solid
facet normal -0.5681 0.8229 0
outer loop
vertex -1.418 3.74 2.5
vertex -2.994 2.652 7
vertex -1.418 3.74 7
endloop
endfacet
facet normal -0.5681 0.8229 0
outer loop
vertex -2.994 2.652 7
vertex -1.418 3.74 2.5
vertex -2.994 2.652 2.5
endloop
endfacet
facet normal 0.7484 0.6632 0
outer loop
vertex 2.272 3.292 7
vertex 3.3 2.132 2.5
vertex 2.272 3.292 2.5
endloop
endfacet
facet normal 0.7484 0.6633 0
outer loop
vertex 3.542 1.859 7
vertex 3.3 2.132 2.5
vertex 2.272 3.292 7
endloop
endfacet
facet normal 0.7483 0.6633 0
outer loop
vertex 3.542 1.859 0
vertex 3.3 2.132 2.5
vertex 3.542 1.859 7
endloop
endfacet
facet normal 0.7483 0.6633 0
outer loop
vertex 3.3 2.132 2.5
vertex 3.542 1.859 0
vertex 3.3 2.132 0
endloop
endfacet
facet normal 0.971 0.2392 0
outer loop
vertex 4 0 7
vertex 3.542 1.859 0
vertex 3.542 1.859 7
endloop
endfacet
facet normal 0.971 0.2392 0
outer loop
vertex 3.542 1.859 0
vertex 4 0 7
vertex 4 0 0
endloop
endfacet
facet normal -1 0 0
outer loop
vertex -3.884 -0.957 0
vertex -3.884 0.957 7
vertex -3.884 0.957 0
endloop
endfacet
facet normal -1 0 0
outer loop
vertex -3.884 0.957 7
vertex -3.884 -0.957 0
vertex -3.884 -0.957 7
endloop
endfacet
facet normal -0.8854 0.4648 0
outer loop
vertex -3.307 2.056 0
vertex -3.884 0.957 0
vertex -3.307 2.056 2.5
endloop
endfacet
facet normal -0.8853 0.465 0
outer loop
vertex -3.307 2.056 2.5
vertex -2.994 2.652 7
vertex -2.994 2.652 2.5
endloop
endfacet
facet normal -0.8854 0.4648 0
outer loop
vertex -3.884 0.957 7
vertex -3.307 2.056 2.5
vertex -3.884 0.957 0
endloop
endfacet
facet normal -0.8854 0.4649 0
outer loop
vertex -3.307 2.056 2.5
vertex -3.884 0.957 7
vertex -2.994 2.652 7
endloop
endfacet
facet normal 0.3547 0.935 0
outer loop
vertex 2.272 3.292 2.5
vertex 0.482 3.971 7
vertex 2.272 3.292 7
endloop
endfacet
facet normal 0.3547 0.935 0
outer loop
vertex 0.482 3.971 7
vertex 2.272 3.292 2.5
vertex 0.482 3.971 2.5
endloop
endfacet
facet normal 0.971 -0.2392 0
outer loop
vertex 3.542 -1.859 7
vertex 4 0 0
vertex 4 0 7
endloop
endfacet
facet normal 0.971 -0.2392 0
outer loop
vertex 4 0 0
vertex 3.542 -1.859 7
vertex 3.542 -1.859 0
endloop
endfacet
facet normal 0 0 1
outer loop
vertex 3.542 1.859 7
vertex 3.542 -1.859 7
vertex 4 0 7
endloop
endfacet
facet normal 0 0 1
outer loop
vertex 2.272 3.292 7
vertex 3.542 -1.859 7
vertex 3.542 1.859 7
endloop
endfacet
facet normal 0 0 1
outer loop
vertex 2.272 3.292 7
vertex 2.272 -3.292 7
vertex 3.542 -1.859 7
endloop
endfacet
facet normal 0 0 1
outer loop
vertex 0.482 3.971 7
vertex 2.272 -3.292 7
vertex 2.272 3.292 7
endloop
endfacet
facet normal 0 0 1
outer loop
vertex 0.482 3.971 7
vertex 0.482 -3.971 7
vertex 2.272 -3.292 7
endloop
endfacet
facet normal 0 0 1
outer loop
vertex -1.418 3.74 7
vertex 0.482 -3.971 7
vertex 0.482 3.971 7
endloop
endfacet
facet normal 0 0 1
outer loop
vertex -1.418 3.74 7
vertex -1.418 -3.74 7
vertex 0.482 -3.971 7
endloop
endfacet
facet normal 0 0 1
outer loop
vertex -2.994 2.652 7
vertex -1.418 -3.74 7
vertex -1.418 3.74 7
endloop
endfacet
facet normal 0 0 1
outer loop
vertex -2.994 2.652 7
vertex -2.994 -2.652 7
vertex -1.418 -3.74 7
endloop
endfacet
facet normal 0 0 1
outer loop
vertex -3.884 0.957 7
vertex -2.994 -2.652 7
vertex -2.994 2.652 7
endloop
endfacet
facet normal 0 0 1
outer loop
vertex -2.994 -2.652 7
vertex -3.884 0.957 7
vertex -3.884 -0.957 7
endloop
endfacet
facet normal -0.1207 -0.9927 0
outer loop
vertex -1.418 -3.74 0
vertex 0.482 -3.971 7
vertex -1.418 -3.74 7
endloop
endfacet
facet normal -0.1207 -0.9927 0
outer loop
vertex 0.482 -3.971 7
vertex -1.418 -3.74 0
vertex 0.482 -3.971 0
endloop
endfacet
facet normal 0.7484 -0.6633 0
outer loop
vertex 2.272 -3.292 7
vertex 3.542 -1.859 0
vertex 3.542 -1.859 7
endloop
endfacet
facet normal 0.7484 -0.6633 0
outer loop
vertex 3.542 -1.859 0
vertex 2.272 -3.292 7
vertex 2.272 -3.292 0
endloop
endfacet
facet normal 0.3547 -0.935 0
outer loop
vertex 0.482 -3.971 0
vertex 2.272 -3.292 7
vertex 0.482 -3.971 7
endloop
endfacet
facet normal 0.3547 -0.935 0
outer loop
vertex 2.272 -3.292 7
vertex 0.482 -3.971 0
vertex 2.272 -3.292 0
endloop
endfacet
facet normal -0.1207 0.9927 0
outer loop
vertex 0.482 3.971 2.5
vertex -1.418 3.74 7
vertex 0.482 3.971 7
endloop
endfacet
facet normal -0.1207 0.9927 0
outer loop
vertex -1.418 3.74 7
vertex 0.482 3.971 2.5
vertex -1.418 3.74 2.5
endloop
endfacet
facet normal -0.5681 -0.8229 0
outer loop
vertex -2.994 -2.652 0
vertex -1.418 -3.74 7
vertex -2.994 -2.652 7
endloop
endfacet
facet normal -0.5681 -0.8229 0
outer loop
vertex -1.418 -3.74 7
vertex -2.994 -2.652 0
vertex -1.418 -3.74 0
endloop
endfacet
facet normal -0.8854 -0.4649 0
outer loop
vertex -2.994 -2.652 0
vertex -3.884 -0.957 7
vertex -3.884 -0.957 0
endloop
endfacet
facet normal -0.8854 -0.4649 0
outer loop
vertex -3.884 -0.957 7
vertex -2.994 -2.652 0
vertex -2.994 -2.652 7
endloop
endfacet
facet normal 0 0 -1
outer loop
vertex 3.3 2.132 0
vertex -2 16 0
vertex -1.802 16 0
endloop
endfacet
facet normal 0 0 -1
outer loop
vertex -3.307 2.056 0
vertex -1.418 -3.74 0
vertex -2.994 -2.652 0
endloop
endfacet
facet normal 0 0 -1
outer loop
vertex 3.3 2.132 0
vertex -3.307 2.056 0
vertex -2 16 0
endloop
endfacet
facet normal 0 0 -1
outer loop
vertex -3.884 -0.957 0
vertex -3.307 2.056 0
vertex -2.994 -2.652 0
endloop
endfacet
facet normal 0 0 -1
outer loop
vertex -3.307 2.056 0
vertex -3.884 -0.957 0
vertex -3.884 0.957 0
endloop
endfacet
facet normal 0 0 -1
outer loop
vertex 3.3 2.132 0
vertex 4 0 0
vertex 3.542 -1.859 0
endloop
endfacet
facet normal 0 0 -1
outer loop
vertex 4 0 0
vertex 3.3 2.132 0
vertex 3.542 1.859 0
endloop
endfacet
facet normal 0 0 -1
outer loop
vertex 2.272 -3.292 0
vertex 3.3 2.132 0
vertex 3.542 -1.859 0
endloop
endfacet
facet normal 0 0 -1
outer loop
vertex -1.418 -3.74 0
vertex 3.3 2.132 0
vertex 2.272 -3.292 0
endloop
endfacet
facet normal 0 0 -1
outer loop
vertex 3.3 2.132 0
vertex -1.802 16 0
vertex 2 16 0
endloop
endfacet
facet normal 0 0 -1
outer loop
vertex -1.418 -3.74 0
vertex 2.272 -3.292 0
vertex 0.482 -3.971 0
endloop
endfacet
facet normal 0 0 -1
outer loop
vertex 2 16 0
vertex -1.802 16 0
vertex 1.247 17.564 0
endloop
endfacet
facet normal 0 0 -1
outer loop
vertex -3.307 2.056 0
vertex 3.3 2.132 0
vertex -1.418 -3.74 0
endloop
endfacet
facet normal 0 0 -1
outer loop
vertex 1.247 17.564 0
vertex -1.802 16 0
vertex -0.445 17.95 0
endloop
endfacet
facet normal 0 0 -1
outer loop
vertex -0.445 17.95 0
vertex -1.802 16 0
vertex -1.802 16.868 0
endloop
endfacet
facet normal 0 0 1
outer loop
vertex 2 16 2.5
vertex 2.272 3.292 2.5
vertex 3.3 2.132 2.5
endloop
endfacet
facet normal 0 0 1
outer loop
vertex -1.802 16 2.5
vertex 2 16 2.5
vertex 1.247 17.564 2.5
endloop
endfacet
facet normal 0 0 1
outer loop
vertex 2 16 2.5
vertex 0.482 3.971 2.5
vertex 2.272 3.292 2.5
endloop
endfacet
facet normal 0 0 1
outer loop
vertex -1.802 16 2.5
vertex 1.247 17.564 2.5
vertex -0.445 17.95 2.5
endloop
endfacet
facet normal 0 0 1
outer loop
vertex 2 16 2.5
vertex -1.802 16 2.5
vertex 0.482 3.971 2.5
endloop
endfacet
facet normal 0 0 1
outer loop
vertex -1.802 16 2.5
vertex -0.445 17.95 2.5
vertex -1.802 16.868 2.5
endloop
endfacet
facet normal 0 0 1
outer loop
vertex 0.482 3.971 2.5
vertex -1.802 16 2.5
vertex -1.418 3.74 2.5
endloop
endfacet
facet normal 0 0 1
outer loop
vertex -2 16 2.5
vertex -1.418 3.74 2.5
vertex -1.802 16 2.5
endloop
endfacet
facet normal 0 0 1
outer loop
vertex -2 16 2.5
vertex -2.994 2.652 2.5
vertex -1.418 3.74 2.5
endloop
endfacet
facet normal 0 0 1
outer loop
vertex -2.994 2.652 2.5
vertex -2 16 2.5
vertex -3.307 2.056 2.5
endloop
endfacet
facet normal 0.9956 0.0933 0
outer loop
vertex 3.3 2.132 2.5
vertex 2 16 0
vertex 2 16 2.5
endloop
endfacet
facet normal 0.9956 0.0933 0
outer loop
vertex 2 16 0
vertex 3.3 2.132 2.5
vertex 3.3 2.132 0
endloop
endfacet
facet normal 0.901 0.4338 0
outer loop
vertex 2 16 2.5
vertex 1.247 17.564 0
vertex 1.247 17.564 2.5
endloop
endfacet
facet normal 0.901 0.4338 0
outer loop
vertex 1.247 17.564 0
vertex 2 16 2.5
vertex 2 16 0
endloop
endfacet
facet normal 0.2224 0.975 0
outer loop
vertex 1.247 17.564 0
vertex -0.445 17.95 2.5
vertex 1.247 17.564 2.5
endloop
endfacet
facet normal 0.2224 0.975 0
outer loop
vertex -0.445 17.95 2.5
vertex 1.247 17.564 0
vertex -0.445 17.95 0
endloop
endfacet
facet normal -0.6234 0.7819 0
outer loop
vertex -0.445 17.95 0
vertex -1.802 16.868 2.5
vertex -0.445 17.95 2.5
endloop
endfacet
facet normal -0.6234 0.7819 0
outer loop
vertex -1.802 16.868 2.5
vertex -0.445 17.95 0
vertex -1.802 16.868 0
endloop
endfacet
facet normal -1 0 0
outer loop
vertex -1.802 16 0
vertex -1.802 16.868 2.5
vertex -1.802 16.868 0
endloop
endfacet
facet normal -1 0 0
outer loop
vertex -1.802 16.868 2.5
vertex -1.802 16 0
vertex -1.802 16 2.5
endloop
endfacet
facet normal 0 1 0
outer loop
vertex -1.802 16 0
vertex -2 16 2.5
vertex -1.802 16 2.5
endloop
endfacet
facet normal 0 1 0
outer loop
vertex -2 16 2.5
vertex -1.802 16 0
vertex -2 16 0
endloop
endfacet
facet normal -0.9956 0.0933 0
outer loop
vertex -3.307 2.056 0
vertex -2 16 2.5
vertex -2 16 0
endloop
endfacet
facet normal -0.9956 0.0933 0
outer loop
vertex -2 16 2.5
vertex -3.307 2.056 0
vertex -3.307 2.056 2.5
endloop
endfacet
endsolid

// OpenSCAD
module
servo_arm(body_r = 8 / 2,
          arm_r1 = 7 / 2,
          arm_r2 = 4 / 2,
          arm_len = 16,
          arm_t = 2.5,
          body_t = 7)
{
    cylinder(r = body_r, h = body_t);

    linear_extrude(height = arm_t)
    {
        circle(r = arm_r1);
        translate([ 0, arm_len, 0 ]) circle(r = arm_r2);
        polygon(points = [
            [ -arm_r1, 0 ],
            [ arm_r1, 0 ],
            [ arm_r2, arm_len ],
            [ -arm_r2, arm_len ]
        ]);
    }
}

servo_arm();
